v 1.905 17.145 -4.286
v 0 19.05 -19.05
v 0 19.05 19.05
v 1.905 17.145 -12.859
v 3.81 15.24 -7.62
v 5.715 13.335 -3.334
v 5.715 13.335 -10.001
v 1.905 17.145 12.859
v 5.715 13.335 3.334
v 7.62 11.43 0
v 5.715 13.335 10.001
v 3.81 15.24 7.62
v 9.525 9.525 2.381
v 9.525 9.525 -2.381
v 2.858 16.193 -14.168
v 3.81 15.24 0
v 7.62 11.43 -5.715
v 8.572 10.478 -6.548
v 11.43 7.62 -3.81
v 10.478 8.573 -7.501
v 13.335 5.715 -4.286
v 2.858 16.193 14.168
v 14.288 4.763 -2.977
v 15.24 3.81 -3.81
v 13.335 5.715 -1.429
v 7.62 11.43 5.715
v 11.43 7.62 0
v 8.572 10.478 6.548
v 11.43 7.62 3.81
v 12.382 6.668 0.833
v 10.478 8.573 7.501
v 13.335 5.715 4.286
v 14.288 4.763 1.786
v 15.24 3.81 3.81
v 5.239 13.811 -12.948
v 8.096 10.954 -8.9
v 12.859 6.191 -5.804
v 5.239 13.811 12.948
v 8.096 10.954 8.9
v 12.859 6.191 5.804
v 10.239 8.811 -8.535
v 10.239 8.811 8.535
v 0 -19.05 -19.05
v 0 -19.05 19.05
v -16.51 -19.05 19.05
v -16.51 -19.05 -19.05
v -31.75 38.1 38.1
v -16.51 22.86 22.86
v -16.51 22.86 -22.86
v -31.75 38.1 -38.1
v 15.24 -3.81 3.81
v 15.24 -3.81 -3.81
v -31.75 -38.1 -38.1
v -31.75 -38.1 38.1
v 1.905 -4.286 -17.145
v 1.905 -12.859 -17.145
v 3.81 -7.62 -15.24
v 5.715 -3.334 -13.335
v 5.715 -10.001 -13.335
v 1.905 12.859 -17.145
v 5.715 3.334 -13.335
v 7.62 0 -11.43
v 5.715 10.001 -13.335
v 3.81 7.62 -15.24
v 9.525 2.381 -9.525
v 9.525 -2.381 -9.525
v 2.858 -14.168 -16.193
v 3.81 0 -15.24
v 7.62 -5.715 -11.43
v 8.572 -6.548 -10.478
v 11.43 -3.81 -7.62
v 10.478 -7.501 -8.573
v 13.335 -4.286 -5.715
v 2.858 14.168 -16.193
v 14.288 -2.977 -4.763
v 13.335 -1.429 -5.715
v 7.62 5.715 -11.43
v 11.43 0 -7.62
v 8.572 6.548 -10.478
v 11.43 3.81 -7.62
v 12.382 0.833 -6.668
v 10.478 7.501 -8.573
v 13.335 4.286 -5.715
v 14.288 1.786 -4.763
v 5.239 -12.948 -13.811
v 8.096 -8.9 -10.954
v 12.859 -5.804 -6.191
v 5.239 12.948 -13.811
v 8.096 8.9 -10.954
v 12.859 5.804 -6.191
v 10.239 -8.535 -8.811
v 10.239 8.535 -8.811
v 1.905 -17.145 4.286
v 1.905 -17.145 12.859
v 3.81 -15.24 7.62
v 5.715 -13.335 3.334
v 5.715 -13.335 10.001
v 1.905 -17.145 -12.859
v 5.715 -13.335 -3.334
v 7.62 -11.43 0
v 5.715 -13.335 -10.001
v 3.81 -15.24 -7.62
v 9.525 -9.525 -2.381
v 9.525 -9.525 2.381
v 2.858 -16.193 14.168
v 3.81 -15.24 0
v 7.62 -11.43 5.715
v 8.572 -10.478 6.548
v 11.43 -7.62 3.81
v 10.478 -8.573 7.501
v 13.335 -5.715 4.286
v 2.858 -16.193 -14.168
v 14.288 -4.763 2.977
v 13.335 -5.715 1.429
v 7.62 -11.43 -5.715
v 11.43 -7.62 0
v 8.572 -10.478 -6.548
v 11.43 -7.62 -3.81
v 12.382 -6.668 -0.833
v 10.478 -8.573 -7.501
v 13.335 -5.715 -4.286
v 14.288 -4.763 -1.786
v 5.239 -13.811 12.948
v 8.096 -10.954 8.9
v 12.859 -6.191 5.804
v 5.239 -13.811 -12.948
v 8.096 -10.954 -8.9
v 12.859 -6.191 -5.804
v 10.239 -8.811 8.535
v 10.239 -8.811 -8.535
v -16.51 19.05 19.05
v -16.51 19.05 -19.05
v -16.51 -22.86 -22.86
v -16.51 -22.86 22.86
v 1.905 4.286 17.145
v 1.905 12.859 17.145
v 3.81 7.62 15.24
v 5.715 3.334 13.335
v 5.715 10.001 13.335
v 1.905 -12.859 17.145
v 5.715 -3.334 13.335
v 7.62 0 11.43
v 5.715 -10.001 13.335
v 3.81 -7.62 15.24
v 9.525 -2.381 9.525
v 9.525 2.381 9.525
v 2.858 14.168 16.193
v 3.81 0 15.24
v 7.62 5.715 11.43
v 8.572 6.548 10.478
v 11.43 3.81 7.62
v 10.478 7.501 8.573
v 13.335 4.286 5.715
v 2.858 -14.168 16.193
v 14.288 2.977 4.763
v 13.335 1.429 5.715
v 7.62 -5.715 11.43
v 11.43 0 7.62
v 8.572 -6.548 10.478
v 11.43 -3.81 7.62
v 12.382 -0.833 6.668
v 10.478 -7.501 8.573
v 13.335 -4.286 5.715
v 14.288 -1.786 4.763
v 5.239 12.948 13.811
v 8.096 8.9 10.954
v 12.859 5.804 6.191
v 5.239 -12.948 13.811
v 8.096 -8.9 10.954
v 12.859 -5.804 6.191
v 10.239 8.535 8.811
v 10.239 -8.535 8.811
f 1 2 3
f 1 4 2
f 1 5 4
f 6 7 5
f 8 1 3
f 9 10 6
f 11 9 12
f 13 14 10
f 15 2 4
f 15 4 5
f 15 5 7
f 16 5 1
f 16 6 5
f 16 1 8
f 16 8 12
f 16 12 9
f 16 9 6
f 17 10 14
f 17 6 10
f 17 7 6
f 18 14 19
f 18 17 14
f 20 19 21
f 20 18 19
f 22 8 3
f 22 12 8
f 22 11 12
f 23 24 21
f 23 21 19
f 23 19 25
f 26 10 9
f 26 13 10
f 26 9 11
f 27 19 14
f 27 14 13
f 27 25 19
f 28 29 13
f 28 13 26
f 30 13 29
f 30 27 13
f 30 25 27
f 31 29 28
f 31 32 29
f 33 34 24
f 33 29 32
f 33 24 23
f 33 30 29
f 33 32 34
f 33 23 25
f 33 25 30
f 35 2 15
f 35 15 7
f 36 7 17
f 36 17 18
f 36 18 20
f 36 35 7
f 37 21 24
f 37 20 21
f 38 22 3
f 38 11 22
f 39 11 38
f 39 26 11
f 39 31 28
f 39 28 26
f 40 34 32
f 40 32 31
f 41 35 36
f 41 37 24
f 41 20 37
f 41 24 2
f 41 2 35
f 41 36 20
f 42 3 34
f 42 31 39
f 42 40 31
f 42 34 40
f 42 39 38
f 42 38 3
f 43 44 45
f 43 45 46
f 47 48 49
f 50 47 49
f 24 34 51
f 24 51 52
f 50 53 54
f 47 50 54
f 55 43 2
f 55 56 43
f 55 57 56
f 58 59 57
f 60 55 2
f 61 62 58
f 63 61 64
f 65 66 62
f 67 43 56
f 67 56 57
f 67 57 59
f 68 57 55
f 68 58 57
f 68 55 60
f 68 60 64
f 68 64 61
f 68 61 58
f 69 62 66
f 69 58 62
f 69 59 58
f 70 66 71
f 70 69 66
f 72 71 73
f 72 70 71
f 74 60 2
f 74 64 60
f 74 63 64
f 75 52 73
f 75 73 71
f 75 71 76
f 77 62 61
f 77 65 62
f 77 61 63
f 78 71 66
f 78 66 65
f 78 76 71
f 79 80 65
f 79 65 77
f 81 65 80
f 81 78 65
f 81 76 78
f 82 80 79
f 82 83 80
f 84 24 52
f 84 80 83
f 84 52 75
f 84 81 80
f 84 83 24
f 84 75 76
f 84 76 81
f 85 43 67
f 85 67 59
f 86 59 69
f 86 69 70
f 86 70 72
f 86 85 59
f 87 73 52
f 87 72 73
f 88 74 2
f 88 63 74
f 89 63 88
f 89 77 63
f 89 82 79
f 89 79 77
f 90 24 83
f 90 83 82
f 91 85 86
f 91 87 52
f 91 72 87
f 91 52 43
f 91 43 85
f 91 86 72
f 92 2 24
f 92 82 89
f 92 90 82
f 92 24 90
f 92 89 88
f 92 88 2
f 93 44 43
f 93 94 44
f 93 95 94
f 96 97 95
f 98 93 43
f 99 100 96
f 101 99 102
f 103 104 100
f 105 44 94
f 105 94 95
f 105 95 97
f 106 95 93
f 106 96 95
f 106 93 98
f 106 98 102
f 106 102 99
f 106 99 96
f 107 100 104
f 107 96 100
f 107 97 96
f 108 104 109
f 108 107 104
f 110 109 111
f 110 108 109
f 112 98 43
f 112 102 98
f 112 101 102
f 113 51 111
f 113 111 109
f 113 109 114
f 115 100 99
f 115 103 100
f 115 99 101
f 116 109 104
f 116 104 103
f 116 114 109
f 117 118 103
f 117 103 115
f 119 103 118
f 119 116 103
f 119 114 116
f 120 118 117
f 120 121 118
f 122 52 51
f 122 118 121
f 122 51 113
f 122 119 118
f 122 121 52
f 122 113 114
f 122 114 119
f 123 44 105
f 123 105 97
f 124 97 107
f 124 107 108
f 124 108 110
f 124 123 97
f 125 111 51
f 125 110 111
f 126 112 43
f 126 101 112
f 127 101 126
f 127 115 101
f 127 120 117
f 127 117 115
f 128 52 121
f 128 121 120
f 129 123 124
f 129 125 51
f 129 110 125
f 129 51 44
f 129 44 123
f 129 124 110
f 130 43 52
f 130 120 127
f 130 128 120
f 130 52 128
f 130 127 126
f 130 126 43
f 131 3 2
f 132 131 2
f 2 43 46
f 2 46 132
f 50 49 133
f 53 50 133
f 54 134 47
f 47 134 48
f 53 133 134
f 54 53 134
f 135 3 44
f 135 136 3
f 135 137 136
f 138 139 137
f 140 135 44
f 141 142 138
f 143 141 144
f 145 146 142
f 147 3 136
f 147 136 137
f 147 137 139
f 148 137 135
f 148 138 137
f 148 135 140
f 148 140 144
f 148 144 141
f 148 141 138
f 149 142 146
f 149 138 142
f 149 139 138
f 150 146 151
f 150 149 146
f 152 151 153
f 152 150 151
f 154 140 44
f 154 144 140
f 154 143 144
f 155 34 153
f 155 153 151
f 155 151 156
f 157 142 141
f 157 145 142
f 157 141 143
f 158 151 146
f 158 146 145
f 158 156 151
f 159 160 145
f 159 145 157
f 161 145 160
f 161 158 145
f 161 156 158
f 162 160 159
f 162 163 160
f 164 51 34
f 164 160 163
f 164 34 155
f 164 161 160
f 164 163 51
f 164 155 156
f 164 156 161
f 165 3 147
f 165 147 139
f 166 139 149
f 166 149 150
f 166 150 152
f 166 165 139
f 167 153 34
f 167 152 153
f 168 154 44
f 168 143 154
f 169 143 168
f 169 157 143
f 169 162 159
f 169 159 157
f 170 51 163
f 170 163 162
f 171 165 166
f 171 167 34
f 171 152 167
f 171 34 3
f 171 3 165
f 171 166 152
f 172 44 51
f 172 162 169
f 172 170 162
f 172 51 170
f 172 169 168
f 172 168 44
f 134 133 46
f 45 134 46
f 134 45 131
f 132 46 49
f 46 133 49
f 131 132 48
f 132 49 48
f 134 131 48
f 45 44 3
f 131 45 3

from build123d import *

# Parameters (mm, degrees)
SKETCH4_W                     = 38.1
SKETCH4_H                     = 38.1
BOSS_EXTRUDE2_DEPTH           = 15.24
BOSS_EXTRUDE2_TAPER           = 45
BOSS_EXTRUDE2_OTHER_WAY_DEPTH = 19.05
SKETCH10_W                    = 50.8
SKETCH10_H                    = 50.8
BOSS_EXTRUDE3_DEPTH           = 12.7
BOSS_EXTRUDE3_TAPER           = -45
BOSS_EXTRUDE3_OTHER_WAY_DEPTH = 2.54
BOSS_EXTRUDE3_OTHER_WAY_TAPER = 45


with BuildPart() as part:
    # Sketch4 → Boss-Extrude2 (new body)
    with BuildSketch(Plane(origin=(0, 0, 0), x_dir=(0, 0, -1), z_dir=(1, 0, 0))):
        Rectangle(SKETCH4_W, SKETCH4_H)
    extrude(amount=BOSS_EXTRUDE2_DEPTH, taper=BOSS_EXTRUDE2_TAPER)

    # Sketch4 → Boss-Extrude2 other way (add)
    with BuildSketch(Plane(origin=(0, 0, 0), x_dir=(0, 0, -1), z_dir=(1, 0, 0))):
        Rectangle(SKETCH4_W, SKETCH4_H)
    extrude(amount=-BOSS_EXTRUDE2_OTHER_WAY_DEPTH)

    # Sketch10 → Boss-Extrude3 (add)
    with BuildSketch(Plane.ZY.offset(19.05)):
        Rectangle(SKETCH10_W, SKETCH10_H)
    extrude(amount=BOSS_EXTRUDE3_DEPTH, taper=BOSS_EXTRUDE3_TAPER)

    # Sketch10 → Boss-Extrude3 other way (add)
    with BuildSketch(Plane.ZY.offset(19.05)):
        Rectangle(SKETCH10_W, SKETCH10_H)
    extrude(amount=-BOSS_EXTRUDE3_OTHER_WAY_DEPTH, taper=BOSS_EXTRUDE3_OTHER_WAY_TAPER)


solid = part.part
